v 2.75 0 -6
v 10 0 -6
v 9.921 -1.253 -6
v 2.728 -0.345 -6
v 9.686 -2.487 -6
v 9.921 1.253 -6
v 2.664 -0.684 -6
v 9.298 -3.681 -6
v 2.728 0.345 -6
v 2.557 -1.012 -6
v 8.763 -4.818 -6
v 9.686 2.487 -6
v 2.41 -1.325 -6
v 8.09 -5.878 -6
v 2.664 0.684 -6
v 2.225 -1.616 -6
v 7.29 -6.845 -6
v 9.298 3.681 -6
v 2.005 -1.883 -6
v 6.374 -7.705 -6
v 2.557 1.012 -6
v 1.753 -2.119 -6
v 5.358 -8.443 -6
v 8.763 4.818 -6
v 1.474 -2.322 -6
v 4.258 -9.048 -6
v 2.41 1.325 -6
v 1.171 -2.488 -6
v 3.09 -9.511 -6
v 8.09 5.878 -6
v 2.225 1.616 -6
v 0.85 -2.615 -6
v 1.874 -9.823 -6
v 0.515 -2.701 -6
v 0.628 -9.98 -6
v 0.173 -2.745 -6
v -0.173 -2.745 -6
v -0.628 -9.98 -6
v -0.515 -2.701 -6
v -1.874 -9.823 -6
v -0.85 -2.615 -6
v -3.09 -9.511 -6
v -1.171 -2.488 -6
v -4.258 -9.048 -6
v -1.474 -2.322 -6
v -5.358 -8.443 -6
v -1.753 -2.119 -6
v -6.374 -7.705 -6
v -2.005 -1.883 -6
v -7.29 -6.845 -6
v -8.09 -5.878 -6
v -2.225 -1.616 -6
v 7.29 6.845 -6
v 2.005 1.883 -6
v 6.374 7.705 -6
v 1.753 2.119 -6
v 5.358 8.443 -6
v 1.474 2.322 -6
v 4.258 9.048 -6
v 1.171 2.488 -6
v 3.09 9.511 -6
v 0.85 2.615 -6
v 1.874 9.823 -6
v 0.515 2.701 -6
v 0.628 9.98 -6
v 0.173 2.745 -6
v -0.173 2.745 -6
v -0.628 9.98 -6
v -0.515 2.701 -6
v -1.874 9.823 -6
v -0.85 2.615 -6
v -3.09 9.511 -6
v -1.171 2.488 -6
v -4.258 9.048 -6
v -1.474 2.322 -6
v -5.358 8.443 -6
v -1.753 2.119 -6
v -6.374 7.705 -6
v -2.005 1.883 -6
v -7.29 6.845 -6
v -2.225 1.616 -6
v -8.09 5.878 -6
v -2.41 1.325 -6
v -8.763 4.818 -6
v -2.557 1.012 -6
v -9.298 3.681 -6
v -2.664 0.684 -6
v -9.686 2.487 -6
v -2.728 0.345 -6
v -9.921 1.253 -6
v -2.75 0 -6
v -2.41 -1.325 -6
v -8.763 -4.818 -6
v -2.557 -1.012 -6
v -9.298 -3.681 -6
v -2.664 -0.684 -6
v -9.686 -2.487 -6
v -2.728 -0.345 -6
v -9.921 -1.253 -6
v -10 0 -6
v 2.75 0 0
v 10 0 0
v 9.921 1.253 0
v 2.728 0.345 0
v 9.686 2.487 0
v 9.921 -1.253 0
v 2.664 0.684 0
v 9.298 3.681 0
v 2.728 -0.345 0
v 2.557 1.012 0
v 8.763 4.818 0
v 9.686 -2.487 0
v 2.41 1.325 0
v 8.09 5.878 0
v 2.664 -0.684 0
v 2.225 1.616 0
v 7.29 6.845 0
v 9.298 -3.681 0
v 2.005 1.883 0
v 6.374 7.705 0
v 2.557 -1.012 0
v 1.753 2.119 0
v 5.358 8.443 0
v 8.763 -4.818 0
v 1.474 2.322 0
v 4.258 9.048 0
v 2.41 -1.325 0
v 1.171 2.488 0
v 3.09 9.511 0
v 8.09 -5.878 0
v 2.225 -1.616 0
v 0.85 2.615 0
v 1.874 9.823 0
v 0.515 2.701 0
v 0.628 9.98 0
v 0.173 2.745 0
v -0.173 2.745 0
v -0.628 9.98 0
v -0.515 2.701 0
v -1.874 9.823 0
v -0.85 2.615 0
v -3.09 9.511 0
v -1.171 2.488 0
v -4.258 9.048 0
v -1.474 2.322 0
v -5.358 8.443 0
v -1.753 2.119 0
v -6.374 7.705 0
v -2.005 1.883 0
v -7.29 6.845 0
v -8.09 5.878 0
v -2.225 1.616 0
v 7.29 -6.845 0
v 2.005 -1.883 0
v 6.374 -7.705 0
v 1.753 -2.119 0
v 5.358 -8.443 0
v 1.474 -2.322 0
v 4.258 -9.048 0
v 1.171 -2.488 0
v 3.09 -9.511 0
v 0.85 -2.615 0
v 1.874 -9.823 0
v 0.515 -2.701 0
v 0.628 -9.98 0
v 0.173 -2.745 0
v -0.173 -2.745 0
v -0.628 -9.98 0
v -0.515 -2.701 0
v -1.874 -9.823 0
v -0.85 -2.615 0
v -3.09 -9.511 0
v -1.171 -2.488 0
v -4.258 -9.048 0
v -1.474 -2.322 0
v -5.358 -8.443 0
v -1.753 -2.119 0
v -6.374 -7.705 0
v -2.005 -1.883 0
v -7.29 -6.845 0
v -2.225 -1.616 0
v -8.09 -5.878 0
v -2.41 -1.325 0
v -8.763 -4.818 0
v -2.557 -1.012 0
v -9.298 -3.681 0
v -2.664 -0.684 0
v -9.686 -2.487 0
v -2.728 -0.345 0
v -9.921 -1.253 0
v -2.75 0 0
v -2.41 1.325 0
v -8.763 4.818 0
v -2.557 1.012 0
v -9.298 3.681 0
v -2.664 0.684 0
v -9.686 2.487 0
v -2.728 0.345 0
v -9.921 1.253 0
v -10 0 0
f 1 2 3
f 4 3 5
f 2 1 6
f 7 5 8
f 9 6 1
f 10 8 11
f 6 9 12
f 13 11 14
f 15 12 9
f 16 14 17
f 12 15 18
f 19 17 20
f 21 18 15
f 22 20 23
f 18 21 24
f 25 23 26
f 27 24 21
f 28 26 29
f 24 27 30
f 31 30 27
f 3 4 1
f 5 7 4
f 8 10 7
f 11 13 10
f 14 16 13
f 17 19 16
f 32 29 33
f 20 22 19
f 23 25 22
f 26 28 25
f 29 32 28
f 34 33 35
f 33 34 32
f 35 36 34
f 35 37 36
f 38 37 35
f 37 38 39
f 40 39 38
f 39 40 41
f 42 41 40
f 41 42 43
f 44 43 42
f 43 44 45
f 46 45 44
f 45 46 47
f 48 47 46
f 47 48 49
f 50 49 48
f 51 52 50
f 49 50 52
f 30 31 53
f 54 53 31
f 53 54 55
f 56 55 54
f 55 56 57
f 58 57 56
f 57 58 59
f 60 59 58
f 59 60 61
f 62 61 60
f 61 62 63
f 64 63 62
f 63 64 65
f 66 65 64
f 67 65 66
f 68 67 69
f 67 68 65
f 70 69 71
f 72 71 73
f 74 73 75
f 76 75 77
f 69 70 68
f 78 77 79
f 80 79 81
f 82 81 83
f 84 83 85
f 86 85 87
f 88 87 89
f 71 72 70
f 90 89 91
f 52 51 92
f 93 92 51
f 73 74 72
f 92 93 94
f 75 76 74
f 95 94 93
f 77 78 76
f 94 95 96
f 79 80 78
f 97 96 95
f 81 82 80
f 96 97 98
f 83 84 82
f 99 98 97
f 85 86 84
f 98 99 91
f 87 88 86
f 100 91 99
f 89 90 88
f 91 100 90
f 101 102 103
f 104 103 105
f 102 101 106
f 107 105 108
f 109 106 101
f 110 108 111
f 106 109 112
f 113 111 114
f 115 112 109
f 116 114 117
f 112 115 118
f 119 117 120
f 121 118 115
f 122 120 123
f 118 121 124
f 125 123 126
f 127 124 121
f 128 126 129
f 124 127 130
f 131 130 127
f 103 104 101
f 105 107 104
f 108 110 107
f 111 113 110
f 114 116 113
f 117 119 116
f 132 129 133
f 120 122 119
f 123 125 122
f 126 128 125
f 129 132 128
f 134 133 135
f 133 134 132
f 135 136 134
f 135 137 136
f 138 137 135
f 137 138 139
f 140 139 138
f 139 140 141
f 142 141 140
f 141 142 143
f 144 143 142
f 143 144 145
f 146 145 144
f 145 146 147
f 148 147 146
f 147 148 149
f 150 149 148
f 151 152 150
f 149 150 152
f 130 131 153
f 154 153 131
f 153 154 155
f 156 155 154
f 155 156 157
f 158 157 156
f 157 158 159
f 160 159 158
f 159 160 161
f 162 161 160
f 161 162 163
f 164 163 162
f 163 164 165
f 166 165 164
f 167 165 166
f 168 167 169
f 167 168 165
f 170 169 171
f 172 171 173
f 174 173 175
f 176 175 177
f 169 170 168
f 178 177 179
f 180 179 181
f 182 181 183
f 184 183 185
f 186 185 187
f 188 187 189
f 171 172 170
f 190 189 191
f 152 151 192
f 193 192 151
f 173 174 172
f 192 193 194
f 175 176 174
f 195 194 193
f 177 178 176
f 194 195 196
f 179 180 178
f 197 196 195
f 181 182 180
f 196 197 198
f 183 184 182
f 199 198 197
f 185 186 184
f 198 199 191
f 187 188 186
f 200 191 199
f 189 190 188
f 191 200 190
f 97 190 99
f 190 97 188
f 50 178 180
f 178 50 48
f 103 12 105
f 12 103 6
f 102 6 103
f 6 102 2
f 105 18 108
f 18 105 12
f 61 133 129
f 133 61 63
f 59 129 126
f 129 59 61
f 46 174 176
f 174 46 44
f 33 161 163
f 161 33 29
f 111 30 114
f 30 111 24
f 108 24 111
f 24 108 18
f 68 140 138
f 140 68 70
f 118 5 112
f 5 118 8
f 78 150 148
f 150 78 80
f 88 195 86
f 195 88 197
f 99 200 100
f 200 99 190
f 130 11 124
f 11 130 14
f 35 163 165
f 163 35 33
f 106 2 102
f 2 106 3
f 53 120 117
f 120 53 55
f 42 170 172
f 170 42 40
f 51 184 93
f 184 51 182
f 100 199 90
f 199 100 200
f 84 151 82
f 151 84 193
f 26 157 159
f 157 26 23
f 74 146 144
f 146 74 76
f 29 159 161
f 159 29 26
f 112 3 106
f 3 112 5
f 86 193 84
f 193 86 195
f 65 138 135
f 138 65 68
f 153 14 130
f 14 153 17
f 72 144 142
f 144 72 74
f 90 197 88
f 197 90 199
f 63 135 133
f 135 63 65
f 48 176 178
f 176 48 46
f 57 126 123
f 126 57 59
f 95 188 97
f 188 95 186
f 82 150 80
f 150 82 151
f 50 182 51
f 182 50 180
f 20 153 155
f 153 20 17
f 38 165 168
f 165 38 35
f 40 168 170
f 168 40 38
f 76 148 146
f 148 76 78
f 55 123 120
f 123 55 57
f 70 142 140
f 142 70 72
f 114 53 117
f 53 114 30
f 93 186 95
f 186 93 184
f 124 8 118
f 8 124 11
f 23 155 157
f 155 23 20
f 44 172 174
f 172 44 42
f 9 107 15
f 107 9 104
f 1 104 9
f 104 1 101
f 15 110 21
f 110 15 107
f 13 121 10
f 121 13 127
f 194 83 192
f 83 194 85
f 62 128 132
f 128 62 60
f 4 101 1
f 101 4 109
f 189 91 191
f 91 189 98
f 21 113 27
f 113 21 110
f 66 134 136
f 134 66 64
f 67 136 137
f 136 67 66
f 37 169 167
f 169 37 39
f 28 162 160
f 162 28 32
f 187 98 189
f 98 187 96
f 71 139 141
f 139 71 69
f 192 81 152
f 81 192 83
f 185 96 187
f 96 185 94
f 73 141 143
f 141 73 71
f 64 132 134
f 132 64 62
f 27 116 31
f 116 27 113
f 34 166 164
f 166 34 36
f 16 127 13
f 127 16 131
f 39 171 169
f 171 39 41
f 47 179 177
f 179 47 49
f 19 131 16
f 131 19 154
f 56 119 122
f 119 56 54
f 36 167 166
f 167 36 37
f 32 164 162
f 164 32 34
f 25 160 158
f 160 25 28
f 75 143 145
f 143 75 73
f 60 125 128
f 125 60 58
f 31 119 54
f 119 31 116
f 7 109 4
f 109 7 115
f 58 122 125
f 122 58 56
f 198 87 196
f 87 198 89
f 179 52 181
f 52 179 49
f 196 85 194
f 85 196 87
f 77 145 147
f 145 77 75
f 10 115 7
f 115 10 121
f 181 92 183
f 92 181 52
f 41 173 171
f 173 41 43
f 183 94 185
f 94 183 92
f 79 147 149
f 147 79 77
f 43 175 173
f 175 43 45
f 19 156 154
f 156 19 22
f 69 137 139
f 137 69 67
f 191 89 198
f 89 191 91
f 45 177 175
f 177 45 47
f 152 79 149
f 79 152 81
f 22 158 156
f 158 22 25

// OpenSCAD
$fn = 50;


difference() {
	union() {
		translate(v = [0, 0, -6.0000000000]) {
			cylinder(h = 6, r = 7.0000000000);
		}
		translate(v = [0, 0, -6.0000000000]) {
			cylinder(h = 6, r = 10.0000000000);
		}
	}
	union() {
		#translate(v = [0, 0, -6]) {
			cylinder(h = 6, r = 2.7500000000);
		}
	}
}
